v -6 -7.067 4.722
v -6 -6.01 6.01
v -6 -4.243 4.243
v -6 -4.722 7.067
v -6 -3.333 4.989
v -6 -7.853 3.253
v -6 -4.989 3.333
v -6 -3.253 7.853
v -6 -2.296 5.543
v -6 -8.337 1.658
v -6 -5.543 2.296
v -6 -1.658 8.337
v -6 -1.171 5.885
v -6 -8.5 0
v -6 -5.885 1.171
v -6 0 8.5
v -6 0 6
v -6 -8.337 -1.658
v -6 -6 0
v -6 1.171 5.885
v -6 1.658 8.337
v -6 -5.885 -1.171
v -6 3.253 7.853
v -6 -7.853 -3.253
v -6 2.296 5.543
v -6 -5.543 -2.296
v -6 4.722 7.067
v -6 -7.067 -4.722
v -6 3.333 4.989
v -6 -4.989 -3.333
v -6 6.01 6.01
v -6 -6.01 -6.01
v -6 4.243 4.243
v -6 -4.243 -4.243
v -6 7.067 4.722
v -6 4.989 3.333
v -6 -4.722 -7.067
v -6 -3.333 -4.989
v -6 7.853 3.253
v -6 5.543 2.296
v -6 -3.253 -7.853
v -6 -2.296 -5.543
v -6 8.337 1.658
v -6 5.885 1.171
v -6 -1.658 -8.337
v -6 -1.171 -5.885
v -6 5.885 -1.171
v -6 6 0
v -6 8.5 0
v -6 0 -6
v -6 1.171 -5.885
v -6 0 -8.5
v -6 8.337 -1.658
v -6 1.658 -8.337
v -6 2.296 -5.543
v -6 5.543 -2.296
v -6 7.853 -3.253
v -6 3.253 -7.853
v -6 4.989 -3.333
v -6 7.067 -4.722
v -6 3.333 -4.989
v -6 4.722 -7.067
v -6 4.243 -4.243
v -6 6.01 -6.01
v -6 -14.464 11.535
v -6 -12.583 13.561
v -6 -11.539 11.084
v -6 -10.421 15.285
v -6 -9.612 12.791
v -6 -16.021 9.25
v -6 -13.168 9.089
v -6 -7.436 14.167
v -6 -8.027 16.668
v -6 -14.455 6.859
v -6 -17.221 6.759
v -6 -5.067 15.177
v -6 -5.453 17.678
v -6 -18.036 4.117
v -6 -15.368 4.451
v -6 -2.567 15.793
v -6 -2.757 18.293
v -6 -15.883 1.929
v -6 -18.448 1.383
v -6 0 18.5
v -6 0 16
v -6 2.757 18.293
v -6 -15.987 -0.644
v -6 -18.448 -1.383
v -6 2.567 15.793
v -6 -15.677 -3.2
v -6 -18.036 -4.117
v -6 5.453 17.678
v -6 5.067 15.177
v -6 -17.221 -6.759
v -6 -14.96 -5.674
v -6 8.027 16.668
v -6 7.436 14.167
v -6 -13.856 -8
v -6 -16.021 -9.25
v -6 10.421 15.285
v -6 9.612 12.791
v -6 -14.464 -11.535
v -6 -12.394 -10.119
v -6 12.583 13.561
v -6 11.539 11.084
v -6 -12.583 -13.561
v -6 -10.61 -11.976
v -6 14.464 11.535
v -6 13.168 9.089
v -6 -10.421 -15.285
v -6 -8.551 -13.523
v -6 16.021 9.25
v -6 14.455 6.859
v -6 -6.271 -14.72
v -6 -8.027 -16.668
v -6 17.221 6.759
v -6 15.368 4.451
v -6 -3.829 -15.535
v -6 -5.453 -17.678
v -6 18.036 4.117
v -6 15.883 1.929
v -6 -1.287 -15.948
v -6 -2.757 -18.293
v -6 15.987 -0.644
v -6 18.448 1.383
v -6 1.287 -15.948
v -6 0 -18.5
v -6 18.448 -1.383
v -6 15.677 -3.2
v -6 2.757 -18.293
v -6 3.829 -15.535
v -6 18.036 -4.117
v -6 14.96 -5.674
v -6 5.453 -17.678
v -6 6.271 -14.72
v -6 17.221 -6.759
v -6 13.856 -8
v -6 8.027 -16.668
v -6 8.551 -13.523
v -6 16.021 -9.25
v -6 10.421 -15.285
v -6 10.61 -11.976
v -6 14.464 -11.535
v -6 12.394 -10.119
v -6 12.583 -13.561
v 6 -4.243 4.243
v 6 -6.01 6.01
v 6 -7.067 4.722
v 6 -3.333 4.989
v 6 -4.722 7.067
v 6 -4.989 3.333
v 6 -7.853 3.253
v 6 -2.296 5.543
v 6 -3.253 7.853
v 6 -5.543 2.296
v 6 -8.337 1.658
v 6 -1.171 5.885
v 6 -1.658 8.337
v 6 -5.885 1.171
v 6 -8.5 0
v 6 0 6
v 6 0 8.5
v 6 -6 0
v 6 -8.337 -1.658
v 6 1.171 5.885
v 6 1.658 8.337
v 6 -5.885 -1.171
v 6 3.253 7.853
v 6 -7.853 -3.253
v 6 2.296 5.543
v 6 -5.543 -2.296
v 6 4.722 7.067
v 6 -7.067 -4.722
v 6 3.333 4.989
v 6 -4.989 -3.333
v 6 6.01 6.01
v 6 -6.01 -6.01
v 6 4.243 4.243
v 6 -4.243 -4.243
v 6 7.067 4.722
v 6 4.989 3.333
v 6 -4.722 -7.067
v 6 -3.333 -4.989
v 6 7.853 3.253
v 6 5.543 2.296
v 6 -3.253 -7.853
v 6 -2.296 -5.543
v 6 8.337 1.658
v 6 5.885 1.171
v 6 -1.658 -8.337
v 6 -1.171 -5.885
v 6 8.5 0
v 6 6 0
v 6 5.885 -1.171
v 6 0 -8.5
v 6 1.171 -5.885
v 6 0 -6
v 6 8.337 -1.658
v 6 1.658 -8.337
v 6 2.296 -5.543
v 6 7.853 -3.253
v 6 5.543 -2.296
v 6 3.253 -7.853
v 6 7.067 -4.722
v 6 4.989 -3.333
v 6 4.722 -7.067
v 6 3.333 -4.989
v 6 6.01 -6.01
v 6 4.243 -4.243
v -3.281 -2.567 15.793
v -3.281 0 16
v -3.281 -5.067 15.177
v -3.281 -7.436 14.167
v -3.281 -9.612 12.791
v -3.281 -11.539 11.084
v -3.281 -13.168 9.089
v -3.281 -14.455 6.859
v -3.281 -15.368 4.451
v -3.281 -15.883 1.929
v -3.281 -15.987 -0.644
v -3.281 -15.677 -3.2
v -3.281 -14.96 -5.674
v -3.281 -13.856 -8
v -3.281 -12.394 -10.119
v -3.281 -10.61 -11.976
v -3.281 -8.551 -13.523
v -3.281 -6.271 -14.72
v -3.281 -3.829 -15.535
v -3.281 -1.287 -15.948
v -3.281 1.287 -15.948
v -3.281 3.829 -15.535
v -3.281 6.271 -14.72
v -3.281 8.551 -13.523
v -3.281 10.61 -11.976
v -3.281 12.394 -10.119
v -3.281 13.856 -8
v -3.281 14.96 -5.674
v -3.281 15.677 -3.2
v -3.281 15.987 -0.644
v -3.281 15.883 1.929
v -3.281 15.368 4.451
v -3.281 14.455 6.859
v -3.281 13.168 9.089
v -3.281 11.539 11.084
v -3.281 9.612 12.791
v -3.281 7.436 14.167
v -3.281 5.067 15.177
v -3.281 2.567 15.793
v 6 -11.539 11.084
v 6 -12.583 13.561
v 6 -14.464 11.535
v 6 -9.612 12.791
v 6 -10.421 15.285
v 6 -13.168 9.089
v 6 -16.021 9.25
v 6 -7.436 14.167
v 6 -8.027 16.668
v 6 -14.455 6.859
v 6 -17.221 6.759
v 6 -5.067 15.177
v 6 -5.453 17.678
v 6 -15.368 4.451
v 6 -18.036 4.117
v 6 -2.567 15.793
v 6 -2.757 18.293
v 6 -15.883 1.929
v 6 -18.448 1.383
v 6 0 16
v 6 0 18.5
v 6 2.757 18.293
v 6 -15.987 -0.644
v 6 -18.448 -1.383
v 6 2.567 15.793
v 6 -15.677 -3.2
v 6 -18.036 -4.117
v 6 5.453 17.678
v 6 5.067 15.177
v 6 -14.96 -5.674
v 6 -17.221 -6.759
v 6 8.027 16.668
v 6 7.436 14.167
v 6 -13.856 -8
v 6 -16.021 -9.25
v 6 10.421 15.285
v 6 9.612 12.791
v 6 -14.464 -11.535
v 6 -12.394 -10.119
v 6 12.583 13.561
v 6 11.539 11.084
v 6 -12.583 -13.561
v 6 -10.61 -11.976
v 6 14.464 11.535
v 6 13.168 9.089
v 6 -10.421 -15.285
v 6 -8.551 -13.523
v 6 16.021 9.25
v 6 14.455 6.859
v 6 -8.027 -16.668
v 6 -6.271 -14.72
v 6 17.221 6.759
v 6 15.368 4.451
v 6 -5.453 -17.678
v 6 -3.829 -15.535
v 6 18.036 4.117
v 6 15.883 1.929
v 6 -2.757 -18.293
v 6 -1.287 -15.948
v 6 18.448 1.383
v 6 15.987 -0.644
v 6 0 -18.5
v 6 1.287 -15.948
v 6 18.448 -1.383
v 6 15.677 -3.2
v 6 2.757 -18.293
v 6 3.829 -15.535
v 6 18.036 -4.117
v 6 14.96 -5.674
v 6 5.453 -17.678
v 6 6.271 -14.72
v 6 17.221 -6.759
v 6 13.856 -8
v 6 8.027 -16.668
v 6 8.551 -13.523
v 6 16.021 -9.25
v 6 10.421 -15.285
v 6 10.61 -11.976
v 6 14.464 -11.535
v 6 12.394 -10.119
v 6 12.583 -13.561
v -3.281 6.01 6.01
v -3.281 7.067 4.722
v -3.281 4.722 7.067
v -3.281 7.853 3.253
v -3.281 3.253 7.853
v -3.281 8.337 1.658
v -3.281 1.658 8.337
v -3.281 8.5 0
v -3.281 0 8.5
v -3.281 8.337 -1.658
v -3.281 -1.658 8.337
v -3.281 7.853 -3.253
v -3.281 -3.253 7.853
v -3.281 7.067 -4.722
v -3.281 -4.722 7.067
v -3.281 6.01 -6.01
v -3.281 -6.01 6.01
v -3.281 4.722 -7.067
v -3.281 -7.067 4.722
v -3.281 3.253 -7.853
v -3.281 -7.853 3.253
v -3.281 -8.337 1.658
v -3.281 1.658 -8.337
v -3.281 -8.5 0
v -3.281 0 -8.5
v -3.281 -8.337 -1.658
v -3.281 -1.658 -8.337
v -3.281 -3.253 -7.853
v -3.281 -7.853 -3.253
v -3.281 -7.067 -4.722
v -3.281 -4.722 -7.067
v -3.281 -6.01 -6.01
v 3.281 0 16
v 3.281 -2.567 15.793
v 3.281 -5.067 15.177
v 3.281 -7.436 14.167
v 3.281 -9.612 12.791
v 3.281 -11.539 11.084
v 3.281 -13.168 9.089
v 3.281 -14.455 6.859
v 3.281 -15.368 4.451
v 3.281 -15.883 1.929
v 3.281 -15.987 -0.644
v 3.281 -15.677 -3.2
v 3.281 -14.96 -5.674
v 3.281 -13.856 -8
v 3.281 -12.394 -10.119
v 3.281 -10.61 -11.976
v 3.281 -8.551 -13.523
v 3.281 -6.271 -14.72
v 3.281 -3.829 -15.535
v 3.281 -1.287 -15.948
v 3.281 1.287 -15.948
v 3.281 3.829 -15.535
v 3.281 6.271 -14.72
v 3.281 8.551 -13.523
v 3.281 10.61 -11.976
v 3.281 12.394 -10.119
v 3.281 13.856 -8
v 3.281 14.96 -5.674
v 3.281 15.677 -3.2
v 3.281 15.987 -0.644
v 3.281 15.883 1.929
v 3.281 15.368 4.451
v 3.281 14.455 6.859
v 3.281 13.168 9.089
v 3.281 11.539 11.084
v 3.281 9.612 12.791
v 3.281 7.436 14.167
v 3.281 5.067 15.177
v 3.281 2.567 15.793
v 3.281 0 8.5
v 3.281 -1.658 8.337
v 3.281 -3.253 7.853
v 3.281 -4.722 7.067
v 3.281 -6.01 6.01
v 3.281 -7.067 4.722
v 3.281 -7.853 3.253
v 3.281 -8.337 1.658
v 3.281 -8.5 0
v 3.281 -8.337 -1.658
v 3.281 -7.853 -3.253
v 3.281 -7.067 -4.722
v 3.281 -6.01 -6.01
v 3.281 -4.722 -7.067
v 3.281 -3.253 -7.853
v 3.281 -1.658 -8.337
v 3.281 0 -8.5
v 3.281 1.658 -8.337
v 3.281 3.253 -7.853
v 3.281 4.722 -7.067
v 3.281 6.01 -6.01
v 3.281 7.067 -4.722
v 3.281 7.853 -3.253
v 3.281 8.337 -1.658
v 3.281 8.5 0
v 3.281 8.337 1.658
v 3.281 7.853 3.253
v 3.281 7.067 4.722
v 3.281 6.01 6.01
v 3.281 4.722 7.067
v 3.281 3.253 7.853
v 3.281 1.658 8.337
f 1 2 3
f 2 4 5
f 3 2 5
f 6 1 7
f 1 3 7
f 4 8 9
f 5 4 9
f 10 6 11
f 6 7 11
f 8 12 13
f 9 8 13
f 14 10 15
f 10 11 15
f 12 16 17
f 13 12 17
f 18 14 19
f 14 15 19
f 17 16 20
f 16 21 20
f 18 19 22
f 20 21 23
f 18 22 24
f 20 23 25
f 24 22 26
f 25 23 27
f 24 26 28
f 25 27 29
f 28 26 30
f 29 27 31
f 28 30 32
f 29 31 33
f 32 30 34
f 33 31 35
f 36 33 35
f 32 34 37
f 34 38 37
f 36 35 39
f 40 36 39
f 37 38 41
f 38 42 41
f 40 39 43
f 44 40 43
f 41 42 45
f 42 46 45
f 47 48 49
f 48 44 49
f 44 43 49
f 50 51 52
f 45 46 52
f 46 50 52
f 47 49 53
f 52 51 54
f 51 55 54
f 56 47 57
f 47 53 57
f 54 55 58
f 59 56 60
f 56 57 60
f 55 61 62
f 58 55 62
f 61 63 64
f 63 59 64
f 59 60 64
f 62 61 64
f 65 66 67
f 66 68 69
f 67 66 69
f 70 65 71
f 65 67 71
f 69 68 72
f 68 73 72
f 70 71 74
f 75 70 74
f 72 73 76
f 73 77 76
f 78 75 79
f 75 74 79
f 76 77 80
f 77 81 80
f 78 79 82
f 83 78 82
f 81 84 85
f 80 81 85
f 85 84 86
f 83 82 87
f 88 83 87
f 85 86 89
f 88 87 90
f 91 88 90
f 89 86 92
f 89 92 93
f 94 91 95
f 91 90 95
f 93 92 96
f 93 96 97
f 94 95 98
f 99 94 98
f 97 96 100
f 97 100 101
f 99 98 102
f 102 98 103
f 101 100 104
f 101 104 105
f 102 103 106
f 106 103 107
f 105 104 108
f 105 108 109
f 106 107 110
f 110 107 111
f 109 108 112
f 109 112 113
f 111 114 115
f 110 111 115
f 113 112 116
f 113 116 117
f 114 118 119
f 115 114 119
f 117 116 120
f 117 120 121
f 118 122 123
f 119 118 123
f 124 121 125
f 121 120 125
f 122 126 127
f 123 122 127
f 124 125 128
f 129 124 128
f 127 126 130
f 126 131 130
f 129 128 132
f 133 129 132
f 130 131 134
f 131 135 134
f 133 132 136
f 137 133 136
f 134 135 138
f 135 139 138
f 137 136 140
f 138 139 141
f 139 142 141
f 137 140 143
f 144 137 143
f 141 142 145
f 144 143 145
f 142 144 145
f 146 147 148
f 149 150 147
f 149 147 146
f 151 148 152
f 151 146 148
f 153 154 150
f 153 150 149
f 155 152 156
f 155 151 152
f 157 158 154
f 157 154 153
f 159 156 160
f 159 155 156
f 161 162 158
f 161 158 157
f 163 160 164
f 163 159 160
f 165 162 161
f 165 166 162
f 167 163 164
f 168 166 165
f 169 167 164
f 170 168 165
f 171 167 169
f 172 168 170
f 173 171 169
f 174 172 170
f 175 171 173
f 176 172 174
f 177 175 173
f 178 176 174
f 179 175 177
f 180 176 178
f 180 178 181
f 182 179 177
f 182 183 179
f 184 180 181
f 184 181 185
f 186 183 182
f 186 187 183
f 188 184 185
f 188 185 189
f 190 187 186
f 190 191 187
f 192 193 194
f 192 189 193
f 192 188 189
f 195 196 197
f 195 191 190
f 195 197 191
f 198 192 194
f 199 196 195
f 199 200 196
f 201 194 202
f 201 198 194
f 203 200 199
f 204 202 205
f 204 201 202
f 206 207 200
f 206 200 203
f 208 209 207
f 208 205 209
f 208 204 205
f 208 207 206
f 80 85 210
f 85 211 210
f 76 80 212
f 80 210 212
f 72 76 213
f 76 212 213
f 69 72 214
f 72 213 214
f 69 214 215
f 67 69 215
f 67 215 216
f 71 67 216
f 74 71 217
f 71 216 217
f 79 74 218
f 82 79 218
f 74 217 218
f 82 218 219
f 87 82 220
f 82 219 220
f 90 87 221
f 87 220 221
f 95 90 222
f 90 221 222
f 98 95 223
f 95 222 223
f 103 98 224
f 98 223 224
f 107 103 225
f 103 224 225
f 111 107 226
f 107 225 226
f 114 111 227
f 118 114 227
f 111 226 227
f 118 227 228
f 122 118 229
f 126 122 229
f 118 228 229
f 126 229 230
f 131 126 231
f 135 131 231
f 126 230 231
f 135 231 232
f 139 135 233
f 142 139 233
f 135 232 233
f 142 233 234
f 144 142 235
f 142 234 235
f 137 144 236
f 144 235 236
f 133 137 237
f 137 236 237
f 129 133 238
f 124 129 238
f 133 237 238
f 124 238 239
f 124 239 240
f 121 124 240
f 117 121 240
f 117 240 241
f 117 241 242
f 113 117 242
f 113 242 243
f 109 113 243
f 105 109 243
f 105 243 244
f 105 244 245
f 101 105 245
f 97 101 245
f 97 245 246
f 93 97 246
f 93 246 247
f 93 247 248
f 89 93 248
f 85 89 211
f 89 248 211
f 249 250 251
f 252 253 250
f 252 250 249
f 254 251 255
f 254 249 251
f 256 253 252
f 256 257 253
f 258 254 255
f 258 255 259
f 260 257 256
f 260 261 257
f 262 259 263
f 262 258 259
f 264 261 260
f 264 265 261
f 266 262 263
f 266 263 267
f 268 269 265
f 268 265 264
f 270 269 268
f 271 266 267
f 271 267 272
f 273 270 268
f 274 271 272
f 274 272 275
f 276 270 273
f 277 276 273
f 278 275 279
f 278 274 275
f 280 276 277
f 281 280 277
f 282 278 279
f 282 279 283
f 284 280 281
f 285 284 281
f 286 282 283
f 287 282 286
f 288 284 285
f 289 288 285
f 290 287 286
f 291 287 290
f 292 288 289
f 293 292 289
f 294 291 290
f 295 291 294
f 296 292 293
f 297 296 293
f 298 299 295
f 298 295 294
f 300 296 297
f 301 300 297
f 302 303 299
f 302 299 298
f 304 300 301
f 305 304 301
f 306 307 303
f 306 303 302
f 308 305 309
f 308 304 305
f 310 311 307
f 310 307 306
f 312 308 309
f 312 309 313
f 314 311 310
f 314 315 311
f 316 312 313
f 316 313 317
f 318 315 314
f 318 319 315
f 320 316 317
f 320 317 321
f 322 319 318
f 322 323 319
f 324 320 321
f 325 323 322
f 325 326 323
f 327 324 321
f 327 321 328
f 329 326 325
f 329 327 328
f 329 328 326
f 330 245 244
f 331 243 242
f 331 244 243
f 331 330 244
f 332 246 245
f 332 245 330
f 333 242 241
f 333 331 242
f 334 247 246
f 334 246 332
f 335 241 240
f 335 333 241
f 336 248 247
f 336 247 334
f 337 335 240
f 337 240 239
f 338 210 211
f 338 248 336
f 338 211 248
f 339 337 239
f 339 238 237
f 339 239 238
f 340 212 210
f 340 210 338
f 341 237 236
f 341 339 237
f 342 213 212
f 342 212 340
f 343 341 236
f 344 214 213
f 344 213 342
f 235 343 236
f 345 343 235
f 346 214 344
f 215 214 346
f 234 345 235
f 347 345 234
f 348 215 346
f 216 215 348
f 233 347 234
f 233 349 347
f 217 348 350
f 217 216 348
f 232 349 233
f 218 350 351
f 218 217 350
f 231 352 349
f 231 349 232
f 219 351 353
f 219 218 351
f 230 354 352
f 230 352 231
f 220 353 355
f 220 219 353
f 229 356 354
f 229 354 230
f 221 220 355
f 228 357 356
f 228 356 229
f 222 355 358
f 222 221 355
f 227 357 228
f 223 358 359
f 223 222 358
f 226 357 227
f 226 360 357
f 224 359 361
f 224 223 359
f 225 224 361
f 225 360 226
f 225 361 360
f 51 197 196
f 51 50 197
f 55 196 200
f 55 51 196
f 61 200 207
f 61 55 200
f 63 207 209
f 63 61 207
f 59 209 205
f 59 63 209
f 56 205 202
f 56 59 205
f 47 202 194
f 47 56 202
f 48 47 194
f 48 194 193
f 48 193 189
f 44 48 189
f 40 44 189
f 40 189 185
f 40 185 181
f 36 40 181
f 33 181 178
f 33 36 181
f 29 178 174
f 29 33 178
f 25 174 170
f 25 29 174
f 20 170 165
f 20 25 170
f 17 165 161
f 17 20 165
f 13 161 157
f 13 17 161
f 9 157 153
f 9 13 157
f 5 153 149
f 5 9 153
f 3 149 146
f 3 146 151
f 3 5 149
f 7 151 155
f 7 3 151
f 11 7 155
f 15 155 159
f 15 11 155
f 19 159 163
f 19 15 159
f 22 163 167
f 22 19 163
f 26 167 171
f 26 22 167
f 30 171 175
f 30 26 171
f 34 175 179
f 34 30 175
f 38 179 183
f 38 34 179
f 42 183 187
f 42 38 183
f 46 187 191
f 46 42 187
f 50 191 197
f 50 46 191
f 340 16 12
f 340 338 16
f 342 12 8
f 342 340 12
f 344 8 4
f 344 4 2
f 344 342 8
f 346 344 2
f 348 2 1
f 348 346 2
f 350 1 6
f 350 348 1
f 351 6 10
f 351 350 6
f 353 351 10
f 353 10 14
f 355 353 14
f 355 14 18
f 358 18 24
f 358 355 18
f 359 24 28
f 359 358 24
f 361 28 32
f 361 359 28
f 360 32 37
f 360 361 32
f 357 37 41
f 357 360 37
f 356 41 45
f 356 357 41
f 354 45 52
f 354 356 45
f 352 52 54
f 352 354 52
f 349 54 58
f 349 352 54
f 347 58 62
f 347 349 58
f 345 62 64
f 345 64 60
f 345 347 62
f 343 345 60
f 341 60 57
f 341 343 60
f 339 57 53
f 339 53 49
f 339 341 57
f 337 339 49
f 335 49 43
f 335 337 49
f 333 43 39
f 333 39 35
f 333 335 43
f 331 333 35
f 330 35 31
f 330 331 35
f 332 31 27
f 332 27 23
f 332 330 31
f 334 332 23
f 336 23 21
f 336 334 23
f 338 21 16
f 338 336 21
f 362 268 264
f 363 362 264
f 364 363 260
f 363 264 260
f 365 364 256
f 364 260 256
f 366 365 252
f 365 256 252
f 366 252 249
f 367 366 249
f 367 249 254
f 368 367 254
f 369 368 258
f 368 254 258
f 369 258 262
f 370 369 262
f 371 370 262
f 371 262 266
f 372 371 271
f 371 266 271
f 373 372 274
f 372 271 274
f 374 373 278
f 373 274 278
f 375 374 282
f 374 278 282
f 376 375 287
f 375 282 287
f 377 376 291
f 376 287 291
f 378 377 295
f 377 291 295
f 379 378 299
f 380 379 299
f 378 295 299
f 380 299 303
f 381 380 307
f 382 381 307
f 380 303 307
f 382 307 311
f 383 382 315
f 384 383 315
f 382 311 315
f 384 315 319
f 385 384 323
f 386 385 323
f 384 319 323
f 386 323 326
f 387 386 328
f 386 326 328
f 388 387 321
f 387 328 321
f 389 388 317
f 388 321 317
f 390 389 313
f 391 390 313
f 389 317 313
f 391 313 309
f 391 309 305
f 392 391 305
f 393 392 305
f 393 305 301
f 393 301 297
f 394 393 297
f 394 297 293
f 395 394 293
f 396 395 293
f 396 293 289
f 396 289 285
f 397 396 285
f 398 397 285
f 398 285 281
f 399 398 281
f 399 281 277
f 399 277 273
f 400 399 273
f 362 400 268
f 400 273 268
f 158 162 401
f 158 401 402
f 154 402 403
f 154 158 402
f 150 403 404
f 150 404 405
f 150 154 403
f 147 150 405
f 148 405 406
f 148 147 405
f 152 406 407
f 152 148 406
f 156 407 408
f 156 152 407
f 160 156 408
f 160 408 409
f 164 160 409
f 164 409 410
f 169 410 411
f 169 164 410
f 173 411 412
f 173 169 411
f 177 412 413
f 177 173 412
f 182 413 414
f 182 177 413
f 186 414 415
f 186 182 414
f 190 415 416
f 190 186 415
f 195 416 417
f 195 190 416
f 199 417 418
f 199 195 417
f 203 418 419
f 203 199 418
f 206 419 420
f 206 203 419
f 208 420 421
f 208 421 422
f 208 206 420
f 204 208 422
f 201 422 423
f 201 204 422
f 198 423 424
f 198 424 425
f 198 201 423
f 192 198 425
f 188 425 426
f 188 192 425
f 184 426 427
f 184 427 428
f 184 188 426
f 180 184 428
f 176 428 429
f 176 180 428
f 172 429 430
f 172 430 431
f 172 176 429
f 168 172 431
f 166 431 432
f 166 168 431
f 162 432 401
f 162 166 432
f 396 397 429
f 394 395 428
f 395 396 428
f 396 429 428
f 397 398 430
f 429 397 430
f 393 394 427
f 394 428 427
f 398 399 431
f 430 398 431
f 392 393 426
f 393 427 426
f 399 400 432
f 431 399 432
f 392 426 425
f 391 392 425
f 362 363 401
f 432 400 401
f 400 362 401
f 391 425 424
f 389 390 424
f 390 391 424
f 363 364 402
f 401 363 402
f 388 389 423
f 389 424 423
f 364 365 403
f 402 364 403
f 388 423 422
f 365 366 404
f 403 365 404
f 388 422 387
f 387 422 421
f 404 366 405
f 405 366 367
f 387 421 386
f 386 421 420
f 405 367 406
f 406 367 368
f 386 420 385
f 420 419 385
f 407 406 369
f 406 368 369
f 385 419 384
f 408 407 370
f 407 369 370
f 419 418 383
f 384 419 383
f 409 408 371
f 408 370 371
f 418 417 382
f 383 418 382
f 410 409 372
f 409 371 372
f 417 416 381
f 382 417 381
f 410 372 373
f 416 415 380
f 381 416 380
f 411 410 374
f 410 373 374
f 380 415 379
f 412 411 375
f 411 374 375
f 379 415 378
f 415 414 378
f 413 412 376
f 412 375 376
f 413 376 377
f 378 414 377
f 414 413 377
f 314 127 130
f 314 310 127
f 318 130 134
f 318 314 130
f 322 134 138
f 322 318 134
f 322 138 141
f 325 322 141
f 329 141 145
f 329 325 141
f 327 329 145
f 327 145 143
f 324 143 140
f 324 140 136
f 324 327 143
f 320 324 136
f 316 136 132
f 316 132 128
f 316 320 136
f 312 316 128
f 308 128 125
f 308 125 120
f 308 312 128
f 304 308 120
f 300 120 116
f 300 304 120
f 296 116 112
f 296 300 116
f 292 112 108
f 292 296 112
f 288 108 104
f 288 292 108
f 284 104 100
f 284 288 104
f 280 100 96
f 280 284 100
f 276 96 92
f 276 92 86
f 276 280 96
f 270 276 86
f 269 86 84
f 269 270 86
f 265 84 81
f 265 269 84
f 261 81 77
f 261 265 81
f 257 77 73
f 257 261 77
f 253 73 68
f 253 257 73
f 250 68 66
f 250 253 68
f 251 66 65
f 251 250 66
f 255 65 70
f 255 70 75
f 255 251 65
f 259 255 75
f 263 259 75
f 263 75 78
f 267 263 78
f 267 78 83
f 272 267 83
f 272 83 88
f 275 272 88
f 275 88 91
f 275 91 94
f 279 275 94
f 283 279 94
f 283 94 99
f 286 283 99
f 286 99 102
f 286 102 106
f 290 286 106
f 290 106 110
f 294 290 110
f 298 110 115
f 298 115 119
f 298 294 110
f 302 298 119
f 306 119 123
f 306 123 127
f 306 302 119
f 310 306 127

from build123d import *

# Parameters (mm, degrees)
SKETCH1_R           = 18.5
SKETCH1_R_2         = 6
BOSS_EXTRUDE1_DEPTH = 6
SKETCH2_W           = 5.43768574
SKETCH2_H           = 7.5


with BuildPart() as part:
    # Sketch1 → Boss-Extrude1 (new, symmetric)
    with BuildSketch(Plane(origin=(0, 0, 0), x_dir=(0, 0, -1), z_dir=(1, 0, 0))):
        Circle(SKETCH1_R)
        Circle(SKETCH1_R_2, mode=Mode.SUBTRACT)
    extrude(amount=BOSS_EXTRUDE1_DEPTH, both=True)

    # Sketch2 → Cut-Revolve1 (revolve, cut)
    with BuildSketch(Plane.XY, mode=Mode.PRIVATE) as cut_revolve1_sk:
        with Locations((6, 12.25)):
            Rectangle(SKETCH2_W, SKETCH2_H)
        with Locations((-6, 12.25)):
            Rectangle(SKETCH2_W, SKETCH2_H)
    revolve(cut_revolve1_sk.sketch.rotate(Axis((0, 0, 0), (1, 0, 0)), 90), axis=Axis((0, 0, 0), (1, 0, 0)), mode=Mode.SUBTRACT)


solid = part.part
